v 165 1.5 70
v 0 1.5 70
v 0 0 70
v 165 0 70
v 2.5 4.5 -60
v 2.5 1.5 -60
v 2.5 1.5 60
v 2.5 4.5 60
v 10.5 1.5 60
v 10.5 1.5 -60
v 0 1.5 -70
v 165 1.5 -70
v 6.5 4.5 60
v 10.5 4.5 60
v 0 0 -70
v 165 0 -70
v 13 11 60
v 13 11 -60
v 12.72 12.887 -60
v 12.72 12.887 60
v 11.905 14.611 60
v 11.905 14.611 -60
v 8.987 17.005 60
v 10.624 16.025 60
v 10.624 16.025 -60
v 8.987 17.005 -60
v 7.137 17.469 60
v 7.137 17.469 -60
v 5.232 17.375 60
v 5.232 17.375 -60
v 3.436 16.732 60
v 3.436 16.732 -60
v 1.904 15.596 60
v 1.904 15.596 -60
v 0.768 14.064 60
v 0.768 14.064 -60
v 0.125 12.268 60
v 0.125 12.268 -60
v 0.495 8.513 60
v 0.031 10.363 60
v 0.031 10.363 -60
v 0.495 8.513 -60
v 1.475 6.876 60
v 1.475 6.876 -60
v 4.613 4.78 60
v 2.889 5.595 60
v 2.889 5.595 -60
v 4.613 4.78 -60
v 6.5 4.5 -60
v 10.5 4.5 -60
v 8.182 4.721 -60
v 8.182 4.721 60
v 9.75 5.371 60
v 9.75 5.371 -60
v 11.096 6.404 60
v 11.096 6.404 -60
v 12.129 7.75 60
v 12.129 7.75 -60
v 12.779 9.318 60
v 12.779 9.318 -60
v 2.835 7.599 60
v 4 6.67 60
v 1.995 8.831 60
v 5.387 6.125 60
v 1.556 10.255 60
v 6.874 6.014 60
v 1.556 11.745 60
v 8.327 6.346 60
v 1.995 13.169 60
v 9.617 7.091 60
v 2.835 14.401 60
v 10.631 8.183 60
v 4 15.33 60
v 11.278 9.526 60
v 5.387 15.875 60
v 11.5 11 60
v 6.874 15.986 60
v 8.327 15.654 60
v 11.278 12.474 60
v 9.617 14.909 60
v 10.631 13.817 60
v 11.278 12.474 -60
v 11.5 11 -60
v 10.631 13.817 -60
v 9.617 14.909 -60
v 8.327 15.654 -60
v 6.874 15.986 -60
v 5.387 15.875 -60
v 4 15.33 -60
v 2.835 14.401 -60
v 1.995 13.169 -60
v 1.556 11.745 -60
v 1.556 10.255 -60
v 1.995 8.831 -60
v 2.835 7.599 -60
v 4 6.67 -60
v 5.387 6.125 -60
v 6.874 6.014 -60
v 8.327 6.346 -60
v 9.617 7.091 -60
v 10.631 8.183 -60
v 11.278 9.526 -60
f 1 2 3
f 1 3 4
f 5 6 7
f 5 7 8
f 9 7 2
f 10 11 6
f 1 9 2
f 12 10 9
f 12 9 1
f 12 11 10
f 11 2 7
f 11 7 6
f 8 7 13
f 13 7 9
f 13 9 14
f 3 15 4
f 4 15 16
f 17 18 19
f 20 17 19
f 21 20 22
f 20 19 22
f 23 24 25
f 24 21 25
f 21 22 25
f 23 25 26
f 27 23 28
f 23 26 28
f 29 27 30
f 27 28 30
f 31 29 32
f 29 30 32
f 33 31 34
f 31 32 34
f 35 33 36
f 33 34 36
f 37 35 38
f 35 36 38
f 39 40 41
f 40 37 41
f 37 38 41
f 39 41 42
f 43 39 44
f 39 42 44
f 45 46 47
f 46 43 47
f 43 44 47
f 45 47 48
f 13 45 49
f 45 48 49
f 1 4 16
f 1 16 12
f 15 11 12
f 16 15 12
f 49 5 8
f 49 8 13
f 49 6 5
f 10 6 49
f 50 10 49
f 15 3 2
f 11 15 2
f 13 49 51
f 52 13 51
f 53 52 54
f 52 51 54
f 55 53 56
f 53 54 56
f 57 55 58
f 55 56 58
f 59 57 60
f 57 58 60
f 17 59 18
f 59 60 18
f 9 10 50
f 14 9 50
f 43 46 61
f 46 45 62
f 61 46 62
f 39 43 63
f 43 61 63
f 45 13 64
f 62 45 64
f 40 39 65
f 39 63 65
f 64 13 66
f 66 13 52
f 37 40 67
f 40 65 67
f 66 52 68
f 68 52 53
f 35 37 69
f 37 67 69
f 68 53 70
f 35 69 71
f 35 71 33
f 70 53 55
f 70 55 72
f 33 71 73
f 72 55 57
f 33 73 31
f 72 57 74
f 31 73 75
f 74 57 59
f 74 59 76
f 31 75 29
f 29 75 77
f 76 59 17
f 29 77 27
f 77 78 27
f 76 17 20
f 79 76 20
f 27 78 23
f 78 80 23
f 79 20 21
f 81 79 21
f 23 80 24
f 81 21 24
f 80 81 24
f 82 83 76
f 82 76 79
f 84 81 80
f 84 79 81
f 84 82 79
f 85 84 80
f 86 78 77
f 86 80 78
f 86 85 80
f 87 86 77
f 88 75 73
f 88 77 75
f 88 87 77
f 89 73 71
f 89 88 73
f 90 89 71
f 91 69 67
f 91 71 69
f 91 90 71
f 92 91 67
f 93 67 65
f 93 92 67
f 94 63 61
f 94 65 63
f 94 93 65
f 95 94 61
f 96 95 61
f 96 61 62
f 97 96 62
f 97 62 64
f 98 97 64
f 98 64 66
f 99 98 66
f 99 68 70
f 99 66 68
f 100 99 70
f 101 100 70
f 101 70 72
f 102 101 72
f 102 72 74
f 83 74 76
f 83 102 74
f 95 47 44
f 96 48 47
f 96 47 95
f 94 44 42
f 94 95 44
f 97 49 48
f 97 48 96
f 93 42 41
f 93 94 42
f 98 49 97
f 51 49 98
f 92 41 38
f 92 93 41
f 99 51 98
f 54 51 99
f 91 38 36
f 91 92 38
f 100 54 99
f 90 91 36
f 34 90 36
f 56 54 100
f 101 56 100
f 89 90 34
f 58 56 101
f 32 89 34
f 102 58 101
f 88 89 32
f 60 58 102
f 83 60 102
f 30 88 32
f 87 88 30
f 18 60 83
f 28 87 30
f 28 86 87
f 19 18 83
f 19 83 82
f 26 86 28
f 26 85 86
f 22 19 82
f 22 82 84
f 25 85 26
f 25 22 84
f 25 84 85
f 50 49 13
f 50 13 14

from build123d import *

# Parameters (mm, degrees)
BOSS_EXTRU_1_DEPTH           = 70
BOSS_EXTRU_1_DEPTH_BACK      = 70
BOSS_EXTRU_1_2_DEPTH         = 70
BOSS_EXTRU_1_2_DEPTH_BACK    = 70
ESQUISSE1_R                  = 6.5
ESQUISSE1_R_2                = 5
ENL_V_MAT_EXTRU_1_DEPTH      = 10
ENL_V_MAT_EXTRU_1_DEPTH_BACK = 20
ESQUISSE2_W                  = 10
ESQUISSE2_H                  = 17


with BuildPart() as part:
    # Esquisse1 → Boss.-Extru.1 (new, two sides: drawn at the far end of the back side and taken through both)
    with BuildSketch(Plane.XY.offset(-BOSS_EXTRU_1_DEPTH_BACK)):
        Polygon((0, 1.5), (0, 0), (165, 0), (165, 1.5), (10.5, 1.5), (10.5, 4.5), (6.5, 4.5), (2.5, 4.5), (2.5, 1.5), align=None)
    extrude(amount=BOSS_EXTRU_1_DEPTH + BOSS_EXTRU_1_DEPTH_BACK)


with BuildPart() as body_2:
    # Esquisse1 → Boss.-Extru.1 2 (new, two sides: drawn at the far end of the back side and taken through both)
    with BuildSketch(Plane.XY.offset(-BOSS_EXTRU_1_2_DEPTH_BACK)):
        with Locations((6.5, 11)):
            Circle(ESQUISSE1_R)
        with Locations((6.5, 11)):
            Circle(ESQUISSE1_R_2, mode=Mode.SUBTRACT)
    extrude(amount=BOSS_EXTRU_1_2_DEPTH + BOSS_EXTRU_1_2_DEPTH_BACK)


with BuildPart() as enl_v_mat_extru_1_tool:
    # Esquisse2 → Enlèv. mat.-Extru.1 (new, two sides: drawn at the far end of the back side and taken through both)
    with BuildSketch(Plane.ZY.offset(-2.5).offset(-ENL_V_MAT_EXTRU_1_DEPTH_BACK)):
        with Locations((-65, 10)):
            Rectangle(ESQUISSE2_W, ESQUISSE2_H)
        with Locations((65, 10)):
            Rectangle(ESQUISSE2_W, ESQUISSE2_H)
    extrude(amount=ENL_V_MAT_EXTRU_1_DEPTH + ENL_V_MAT_EXTRU_1_DEPTH_BACK)


with BuildPart() as part_1:
    add(part.part)

    # Enlèv. mat.-Extru.1: cut by enl_v_mat_extru_1_tool
    add(enl_v_mat_extru_1_tool.part, mode=Mode.SUBTRACT)


with BuildPart() as body_2_1:
    add(body_2.part)

    # Enlèv. mat.-Extru.1: cut by enl_v_mat_extru_1_tool
    add(enl_v_mat_extru_1_tool.part, mode=Mode.SUBTRACT)


solid = Compound([part_1.part, body_2_1.part])
